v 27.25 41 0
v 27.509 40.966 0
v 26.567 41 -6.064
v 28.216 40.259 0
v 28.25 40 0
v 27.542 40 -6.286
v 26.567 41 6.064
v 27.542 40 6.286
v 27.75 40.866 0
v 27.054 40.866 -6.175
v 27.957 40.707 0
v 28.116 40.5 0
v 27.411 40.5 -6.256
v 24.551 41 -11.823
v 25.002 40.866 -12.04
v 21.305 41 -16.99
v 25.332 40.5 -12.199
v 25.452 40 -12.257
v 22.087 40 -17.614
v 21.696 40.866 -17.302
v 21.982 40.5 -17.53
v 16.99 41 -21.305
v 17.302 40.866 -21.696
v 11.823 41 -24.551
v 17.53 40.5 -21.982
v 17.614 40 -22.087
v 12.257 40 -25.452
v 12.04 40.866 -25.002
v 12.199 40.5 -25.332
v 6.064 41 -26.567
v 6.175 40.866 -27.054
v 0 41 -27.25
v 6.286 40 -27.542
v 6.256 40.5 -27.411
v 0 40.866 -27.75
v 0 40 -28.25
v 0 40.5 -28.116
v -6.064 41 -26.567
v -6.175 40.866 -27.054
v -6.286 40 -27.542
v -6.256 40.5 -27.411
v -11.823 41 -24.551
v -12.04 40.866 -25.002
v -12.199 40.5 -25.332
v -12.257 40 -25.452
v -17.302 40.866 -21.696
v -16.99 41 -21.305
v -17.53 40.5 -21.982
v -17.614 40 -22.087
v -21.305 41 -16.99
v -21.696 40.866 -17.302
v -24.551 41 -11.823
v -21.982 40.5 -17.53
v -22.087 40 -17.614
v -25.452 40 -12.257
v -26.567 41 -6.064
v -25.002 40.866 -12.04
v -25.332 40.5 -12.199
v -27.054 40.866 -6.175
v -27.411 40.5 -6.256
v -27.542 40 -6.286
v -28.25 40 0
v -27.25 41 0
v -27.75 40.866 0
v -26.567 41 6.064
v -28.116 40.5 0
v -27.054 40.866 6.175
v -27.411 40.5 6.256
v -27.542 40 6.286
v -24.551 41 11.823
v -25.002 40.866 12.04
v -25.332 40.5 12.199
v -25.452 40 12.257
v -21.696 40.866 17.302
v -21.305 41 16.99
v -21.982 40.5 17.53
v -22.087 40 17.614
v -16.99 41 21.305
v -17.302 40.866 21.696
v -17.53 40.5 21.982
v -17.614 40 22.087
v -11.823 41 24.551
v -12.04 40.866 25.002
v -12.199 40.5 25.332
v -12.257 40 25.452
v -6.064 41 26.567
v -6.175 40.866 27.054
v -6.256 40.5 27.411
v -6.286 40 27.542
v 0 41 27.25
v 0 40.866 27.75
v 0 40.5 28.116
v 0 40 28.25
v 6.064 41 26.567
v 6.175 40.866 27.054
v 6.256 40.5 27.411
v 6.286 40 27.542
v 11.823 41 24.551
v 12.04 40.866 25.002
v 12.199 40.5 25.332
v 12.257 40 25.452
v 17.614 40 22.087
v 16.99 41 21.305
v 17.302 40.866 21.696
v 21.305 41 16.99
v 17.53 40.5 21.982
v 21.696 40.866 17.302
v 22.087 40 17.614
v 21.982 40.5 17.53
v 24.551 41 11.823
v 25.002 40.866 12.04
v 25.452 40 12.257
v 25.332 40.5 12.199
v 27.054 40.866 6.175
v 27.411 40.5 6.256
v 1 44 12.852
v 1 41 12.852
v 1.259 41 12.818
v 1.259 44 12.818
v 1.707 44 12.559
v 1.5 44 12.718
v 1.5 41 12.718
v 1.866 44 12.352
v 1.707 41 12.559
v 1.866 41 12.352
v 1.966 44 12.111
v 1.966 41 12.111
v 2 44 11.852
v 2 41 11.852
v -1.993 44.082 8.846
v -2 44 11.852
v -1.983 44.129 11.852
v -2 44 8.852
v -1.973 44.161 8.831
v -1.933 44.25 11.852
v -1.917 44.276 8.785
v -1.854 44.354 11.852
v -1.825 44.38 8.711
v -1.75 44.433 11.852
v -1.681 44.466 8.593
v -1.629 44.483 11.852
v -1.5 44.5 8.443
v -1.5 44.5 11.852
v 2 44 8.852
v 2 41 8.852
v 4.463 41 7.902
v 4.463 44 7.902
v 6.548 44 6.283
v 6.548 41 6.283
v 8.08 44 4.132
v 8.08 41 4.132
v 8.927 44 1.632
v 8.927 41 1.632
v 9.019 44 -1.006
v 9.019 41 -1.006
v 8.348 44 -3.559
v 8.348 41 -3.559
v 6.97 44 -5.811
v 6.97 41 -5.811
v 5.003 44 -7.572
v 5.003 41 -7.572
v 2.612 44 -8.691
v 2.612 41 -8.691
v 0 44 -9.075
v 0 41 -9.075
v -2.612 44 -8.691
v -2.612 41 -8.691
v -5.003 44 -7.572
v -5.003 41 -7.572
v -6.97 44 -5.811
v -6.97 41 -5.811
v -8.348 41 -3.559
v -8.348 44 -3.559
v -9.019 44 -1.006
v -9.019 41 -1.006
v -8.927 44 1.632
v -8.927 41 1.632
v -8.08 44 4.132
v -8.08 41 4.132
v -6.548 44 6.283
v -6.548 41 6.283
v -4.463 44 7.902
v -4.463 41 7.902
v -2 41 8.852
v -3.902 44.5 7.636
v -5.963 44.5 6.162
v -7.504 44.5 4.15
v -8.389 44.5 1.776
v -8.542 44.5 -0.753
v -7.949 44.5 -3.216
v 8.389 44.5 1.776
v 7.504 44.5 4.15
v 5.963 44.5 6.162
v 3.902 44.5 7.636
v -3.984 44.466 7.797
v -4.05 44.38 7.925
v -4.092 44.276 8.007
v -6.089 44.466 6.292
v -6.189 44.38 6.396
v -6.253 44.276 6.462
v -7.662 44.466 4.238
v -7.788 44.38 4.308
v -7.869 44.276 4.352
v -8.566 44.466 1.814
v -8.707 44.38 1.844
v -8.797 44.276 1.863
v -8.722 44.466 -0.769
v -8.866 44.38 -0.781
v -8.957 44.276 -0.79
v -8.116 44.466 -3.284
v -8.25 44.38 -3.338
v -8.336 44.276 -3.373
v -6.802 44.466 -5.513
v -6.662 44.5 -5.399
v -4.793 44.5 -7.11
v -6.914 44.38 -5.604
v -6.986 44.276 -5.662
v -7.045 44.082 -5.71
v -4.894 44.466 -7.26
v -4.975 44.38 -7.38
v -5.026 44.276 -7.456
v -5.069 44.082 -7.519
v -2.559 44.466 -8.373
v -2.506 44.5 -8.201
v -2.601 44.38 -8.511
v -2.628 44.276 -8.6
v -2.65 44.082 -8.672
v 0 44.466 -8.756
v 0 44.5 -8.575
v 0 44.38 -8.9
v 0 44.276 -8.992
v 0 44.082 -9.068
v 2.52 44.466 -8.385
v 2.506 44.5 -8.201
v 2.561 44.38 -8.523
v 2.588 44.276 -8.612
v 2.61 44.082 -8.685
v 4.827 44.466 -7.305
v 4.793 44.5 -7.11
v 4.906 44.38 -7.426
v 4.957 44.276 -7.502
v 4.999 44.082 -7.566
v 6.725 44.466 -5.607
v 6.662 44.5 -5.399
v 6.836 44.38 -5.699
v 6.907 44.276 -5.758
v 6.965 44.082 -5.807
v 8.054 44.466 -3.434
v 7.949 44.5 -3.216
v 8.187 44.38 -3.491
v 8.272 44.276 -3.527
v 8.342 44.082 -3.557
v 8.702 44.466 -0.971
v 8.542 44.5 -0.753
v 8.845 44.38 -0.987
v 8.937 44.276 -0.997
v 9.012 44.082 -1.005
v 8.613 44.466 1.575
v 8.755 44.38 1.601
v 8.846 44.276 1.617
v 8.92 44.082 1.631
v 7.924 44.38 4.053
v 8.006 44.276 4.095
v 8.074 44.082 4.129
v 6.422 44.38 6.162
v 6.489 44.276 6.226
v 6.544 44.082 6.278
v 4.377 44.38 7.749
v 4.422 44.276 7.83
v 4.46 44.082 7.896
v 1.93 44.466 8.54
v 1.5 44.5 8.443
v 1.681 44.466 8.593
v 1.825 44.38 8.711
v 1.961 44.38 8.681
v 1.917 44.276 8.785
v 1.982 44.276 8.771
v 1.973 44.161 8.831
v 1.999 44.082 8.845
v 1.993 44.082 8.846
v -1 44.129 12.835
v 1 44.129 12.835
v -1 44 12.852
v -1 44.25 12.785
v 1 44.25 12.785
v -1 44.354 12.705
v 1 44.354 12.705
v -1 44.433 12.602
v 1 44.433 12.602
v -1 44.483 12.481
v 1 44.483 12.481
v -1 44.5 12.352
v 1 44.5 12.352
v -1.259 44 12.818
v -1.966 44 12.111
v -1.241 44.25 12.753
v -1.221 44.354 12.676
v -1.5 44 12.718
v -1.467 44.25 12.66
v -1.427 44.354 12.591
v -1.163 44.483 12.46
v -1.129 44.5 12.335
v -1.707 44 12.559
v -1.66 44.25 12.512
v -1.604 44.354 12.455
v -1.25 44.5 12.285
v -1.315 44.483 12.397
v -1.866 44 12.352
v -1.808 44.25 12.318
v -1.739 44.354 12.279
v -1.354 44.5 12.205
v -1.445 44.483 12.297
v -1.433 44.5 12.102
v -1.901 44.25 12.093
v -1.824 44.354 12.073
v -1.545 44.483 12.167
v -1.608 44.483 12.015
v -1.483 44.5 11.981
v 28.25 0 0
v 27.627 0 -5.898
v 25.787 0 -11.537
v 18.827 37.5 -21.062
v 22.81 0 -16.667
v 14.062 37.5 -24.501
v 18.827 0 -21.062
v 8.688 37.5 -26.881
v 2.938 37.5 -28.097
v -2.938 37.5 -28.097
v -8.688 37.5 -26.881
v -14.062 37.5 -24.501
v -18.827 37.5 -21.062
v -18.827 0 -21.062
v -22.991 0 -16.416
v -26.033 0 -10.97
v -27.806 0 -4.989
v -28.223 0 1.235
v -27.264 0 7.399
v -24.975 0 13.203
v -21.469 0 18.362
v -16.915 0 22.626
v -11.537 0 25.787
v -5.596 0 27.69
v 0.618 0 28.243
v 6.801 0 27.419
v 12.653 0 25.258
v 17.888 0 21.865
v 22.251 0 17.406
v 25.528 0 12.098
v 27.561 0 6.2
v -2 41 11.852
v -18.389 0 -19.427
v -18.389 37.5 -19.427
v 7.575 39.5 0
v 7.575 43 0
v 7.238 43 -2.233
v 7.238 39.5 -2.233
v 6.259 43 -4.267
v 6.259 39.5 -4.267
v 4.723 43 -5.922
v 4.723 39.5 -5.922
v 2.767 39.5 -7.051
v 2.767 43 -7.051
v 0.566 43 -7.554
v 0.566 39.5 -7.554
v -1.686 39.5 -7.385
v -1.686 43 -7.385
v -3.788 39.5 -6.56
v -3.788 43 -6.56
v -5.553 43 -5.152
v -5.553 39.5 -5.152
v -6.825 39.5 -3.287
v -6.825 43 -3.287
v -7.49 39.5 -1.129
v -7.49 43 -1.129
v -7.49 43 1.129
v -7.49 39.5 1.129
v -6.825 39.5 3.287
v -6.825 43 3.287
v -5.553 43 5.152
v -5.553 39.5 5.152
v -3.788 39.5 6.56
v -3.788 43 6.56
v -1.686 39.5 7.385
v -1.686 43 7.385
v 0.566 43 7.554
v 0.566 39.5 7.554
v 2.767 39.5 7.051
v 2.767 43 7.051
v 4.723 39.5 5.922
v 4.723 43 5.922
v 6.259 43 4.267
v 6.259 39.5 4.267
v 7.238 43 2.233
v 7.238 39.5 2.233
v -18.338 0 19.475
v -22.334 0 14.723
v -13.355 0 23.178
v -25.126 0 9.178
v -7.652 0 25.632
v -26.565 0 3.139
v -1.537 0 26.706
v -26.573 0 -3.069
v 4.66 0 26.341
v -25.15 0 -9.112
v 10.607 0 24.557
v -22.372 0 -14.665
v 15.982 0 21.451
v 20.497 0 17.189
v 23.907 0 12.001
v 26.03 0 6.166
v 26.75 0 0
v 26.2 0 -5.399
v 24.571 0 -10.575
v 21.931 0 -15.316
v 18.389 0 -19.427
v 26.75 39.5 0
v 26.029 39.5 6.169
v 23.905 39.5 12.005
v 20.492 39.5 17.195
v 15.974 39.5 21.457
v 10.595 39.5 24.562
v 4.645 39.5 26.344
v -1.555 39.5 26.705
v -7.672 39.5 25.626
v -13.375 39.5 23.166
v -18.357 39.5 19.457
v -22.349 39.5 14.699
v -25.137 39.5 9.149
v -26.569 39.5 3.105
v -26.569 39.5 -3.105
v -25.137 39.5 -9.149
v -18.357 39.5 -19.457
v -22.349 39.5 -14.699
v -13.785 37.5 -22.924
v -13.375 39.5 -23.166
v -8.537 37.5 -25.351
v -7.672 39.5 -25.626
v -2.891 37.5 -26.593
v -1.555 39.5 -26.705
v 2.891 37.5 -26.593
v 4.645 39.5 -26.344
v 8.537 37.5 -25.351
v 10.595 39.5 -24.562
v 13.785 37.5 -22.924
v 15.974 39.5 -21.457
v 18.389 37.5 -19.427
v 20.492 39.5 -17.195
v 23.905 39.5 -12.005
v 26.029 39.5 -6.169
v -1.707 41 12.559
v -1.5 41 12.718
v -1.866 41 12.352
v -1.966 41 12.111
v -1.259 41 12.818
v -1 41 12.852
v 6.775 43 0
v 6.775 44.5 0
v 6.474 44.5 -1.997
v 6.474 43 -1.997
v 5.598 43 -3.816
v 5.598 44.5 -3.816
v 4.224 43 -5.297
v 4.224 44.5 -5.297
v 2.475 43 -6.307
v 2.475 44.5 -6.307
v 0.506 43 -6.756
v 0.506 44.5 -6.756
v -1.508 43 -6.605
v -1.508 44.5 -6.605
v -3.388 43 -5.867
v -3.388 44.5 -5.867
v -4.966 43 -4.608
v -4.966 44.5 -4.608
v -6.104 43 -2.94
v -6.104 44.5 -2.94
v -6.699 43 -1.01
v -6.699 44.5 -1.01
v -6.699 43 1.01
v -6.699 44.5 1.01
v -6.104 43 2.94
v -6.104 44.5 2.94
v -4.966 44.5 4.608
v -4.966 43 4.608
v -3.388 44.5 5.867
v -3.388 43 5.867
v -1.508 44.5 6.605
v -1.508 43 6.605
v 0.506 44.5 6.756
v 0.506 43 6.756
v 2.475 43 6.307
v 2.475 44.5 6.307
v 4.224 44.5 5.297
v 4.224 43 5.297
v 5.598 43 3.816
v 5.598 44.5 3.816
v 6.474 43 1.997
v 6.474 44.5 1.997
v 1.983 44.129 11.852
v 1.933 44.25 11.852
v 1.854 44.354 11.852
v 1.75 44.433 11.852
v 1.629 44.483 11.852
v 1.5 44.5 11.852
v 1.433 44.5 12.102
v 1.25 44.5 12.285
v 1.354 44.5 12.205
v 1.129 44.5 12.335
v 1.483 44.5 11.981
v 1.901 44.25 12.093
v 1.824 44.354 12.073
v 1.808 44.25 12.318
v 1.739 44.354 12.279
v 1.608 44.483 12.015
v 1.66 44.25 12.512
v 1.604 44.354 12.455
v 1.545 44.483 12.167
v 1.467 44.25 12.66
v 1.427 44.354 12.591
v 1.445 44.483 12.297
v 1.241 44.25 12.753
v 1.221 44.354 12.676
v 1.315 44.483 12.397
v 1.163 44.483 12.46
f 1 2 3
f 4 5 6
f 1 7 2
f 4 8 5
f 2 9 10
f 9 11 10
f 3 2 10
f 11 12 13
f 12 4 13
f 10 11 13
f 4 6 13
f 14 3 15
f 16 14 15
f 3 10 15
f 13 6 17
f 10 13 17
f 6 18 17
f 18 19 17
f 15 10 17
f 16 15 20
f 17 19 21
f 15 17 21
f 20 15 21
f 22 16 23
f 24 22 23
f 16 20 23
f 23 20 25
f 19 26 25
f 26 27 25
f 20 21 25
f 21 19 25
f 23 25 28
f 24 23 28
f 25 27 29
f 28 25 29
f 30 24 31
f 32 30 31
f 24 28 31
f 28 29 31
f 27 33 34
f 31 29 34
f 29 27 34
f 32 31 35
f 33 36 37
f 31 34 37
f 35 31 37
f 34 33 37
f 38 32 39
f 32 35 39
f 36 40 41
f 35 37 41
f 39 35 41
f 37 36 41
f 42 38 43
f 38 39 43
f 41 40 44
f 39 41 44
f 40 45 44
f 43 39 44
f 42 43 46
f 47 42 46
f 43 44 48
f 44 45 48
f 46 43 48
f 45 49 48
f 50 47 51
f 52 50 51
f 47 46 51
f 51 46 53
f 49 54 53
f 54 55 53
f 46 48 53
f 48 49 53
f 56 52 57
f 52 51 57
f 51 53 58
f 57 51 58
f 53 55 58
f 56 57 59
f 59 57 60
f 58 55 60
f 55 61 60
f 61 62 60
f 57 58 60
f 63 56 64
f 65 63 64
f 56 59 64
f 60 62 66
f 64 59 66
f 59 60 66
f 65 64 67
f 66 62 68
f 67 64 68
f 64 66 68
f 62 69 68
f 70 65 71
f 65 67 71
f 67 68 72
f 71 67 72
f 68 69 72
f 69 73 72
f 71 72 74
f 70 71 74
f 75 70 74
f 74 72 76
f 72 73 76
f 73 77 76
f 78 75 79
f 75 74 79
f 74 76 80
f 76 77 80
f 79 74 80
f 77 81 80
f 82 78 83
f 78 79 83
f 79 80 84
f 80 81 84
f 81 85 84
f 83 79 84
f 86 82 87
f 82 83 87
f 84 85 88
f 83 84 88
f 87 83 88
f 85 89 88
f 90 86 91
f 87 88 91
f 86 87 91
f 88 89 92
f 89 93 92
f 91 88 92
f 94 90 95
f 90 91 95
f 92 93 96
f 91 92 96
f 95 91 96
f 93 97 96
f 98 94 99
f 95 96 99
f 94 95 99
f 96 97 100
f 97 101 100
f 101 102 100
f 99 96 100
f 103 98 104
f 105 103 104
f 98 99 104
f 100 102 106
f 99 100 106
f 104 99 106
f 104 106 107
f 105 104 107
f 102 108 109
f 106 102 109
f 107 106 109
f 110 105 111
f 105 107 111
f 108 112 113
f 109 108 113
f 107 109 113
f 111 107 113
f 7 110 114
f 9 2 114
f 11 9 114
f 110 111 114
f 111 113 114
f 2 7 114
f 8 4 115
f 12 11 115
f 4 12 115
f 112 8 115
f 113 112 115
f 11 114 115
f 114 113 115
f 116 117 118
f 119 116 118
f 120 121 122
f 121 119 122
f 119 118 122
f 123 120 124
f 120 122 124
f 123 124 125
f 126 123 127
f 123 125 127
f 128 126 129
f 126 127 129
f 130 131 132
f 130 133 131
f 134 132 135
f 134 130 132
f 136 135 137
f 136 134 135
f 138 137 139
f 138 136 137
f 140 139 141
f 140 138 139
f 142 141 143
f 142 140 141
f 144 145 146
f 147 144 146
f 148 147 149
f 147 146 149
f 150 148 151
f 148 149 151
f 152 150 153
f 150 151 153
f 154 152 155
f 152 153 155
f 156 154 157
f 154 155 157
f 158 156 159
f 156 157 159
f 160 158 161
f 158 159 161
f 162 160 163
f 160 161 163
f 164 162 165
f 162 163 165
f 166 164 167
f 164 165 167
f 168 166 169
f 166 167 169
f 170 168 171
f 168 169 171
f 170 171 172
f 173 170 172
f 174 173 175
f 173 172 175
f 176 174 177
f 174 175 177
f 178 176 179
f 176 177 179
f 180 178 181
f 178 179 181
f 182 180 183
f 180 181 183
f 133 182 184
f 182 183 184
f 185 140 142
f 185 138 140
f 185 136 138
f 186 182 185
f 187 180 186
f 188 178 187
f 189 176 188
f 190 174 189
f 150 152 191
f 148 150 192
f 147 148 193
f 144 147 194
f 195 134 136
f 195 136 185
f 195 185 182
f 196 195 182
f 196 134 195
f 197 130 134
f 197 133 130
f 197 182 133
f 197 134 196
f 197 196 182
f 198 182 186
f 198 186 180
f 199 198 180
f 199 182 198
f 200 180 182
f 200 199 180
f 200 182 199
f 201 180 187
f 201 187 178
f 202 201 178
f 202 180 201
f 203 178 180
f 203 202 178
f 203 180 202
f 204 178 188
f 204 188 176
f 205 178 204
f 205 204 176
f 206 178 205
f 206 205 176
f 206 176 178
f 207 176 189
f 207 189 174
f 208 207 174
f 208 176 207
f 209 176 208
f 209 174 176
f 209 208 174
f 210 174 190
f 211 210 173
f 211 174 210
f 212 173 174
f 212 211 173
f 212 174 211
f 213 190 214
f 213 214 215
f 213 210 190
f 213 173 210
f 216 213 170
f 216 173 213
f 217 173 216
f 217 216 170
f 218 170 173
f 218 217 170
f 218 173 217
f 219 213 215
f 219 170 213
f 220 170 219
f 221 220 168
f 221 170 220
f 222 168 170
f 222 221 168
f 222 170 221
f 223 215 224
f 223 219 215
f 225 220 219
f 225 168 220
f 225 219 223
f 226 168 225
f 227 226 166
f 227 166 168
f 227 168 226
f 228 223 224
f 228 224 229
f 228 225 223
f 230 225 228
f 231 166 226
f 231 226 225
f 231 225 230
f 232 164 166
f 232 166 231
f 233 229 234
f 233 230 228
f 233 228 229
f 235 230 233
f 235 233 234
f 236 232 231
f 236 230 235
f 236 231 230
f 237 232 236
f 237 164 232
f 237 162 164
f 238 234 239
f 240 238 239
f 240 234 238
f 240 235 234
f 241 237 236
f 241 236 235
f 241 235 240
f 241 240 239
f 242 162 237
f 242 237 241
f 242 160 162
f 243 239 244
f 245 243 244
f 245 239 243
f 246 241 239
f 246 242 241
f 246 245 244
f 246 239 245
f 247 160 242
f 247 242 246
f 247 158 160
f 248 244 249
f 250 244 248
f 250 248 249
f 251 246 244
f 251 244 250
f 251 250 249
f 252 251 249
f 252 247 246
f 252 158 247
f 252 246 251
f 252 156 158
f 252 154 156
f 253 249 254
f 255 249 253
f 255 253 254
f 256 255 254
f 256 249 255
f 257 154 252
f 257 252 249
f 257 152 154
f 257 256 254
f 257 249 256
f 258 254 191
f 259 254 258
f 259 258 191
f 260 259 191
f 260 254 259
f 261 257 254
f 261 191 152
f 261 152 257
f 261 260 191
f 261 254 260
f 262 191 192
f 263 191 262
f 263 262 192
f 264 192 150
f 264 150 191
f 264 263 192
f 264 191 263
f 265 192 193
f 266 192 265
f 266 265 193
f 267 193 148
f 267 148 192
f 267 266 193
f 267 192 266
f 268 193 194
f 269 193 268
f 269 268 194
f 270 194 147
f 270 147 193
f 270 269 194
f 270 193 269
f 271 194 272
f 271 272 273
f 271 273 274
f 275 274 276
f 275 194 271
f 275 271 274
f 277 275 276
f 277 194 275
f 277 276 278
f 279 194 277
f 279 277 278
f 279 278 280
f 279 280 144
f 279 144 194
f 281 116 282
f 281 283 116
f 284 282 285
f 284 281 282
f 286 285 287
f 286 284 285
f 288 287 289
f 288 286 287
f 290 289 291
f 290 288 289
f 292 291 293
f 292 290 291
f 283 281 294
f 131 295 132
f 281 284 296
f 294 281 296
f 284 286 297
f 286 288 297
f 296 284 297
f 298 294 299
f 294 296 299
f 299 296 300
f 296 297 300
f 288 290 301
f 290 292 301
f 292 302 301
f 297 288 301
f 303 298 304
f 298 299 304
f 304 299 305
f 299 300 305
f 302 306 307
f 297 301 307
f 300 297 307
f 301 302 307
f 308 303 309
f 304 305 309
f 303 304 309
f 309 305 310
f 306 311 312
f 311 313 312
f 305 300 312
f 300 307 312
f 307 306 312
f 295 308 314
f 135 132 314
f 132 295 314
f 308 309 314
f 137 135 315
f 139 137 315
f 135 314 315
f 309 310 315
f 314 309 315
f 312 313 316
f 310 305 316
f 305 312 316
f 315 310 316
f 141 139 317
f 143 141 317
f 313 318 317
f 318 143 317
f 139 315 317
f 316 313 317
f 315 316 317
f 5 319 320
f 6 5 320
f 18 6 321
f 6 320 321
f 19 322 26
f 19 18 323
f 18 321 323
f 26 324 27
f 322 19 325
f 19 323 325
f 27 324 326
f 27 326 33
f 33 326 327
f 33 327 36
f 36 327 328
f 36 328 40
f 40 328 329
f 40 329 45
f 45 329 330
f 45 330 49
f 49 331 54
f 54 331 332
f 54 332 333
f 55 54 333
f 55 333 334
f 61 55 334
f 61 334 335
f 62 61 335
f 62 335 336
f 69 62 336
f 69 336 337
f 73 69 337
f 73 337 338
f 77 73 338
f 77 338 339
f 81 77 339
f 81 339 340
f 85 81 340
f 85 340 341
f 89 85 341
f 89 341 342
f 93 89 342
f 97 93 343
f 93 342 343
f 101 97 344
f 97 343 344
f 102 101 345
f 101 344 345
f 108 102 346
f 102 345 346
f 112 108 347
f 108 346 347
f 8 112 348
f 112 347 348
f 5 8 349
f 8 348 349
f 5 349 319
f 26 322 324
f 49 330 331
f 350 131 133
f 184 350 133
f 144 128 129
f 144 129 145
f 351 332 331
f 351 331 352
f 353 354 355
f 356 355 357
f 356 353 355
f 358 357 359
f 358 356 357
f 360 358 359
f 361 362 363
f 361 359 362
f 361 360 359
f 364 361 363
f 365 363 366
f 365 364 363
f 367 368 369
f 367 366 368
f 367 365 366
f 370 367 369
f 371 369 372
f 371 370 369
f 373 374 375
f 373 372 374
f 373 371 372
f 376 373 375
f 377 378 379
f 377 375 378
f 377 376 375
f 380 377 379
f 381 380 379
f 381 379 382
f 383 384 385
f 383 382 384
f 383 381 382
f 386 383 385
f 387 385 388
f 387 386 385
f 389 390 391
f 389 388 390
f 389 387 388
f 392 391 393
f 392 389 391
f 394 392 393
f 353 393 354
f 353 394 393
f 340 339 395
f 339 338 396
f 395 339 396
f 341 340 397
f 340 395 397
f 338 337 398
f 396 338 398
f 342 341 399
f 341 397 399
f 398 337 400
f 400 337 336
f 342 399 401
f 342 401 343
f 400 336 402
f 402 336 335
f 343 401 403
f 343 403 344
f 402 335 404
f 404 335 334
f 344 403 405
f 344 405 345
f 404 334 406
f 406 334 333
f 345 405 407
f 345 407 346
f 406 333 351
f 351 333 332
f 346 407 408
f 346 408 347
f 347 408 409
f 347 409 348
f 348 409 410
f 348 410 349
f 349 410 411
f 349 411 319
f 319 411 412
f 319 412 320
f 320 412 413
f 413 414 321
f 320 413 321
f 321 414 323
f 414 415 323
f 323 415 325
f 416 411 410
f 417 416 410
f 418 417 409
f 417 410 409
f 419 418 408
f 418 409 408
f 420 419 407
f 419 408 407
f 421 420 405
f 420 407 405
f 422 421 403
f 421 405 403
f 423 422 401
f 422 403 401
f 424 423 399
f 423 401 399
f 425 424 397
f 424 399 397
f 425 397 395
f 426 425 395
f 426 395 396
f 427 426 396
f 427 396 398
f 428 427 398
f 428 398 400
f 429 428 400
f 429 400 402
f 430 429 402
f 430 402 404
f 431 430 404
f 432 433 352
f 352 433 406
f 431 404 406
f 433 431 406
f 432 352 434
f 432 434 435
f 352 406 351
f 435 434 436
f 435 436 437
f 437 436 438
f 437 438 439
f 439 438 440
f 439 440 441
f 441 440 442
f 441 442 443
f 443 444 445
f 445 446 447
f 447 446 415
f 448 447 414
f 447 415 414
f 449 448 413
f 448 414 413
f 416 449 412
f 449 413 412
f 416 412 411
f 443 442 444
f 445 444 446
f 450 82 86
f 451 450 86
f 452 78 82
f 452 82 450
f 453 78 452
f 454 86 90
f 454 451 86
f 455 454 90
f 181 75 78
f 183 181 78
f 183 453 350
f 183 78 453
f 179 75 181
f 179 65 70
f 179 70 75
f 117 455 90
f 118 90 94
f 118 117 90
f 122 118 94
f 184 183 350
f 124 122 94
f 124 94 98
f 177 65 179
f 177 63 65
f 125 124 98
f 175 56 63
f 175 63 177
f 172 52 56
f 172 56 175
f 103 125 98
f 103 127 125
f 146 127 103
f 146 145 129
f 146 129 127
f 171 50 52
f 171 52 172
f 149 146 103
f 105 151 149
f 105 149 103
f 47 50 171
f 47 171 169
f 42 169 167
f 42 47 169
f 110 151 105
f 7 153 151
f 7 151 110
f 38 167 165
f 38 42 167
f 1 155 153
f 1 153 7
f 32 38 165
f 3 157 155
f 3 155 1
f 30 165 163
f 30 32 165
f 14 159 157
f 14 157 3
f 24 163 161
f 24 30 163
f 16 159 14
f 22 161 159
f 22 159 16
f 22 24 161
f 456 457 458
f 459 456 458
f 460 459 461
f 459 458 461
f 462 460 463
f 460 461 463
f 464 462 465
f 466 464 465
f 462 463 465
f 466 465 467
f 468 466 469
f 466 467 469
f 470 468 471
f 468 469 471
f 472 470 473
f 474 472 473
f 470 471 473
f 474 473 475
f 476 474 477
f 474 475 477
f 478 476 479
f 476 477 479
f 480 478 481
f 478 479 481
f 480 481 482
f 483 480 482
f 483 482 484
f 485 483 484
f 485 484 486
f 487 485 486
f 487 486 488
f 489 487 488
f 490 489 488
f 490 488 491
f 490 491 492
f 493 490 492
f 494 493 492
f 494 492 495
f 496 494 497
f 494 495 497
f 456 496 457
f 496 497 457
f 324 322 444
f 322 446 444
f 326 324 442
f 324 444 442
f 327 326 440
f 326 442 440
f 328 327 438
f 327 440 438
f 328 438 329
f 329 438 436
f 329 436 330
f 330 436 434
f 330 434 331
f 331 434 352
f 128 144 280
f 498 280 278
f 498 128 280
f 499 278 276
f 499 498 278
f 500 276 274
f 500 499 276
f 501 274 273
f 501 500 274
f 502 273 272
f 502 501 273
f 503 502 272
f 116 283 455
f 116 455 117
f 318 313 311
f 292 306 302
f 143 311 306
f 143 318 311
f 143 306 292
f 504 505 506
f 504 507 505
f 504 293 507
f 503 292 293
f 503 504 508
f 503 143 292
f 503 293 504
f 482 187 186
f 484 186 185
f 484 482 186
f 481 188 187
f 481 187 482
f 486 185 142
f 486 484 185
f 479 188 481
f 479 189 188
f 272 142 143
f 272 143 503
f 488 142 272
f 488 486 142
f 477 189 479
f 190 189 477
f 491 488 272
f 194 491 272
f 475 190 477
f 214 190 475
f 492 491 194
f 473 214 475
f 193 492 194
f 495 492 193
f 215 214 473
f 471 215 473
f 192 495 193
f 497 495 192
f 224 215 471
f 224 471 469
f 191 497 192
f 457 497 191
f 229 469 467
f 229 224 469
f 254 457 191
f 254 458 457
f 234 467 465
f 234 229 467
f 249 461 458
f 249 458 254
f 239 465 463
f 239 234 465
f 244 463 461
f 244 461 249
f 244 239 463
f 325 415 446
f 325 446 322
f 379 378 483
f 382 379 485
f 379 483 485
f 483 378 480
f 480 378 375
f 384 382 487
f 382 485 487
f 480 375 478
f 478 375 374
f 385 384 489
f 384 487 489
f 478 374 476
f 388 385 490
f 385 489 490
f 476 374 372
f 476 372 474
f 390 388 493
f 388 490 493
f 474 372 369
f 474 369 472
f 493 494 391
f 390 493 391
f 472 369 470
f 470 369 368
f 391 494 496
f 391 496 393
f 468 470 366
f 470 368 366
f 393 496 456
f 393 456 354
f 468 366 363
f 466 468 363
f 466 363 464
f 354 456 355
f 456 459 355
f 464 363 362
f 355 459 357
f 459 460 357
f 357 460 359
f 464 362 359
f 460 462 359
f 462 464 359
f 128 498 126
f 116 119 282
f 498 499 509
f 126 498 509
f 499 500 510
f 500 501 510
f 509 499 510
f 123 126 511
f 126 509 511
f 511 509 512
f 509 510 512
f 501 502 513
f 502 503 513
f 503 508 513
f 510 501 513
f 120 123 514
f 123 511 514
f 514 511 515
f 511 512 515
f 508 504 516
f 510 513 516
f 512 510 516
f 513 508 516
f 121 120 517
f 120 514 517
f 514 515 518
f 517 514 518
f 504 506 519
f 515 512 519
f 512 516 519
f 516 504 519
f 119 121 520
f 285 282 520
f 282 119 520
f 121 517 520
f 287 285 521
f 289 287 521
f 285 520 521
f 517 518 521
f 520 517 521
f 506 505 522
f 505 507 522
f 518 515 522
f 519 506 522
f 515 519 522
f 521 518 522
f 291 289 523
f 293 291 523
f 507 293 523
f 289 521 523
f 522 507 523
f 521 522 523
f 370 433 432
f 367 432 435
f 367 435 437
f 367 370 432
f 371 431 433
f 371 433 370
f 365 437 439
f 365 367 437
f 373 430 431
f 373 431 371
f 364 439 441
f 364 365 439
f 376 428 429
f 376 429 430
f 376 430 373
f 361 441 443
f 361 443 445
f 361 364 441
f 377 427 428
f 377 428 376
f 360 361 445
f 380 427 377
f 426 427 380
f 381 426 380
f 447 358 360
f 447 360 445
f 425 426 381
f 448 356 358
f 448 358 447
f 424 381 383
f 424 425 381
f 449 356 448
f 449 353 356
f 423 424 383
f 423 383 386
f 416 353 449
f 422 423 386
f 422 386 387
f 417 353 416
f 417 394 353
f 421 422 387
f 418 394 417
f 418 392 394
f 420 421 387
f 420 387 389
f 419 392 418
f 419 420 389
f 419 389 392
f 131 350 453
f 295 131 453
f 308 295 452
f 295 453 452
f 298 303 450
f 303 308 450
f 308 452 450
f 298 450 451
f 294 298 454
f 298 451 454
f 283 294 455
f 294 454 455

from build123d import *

# Parameters (mm, degrees)
SKETCH1_R           = 28.25
BOSS_EXTRUDE1_DEPTH = 41
SKETCH2_R           = 26.75
CUT_EXTRUDE1_DEPTH  = 39.5
SKETCH3_R           = 9.075
SKETCH3_R_2         = 7.575
BOSS_EXTRUDE2_DEPTH = 3.5
SKETCH4_R           = 9.075
SKETCH4_R_2         = 6.775
BOSS_EXTRUDE3_DEPTH = 1.5
SKETCH5_R           = 7.575
CUT_EXTRUDE2_DEPTH  = 1.5
SKETCH6_W           = 4
SKETCH6_H           = 4
BOSS_EXTRUDE4_DEPTH = 3.5
CUT_EXTRUDE3_DEPTH  = 37.5
FILLET1_R           = 1
FILLET1_2_R         = 0.5


with BuildPart() as part:
    # Sketch1 → Boss-Extrude1 (new body)
    with BuildSketch(Plane(origin=(0, 0, 0), x_dir=(1, 0, 0), z_dir=(0, 1, 0))):
        Circle(SKETCH1_R)
    extrude(amount=BOSS_EXTRUDE1_DEPTH)

    # Sketch2 → Cut-Extrude1 (cut)
    with BuildSketch(Plane.XZ):
        Circle(SKETCH2_R)
    extrude(amount=-CUT_EXTRUDE1_DEPTH, mode=Mode.SUBTRACT)

    # Sketch3 → Boss-Extrude2 (add)
    with BuildSketch(Plane(origin=(0, 41, 0), x_dir=(1, 0, 0), z_dir=(0, 1, 0))):
        Circle(SKETCH3_R)
        Circle(SKETCH3_R_2, mode=Mode.SUBTRACT)
    extrude(amount=BOSS_EXTRUDE2_DEPTH)

    # Sketch4 → Boss-Extrude3 (add)
    with BuildSketch(Plane(origin=(0, 44.5, 0), x_dir=(1, 0, 0), z_dir=(0, 1, 0))):
        Circle(SKETCH4_R)
        Circle(SKETCH4_R_2, mode=Mode.SUBTRACT)
    extrude(amount=-BOSS_EXTRUDE3_DEPTH)

    # Sketch5 → Cut-Extrude2 (cut)
    with BuildSketch(Plane(origin=(0, 41, 0), x_dir=(1, 0, 0), z_dir=(0, 1, 0))):
        Circle(SKETCH5_R)
    extrude(amount=-CUT_EXTRUDE2_DEPTH, mode=Mode.SUBTRACT)

    # Sketch6 → Boss-Extrude4 (add)
    with BuildSketch(Plane(origin=(0, 44.5, 0), x_dir=(1, 0, 0), z_dir=(0, 1, 0))):
        with Locations((0, -10.851871271)):
            Rectangle(SKETCH6_W, SKETCH6_H)
    extrude(amount=-BOSS_EXTRUDE4_DEPTH)

    # Sketch8 → Cut-Extrude3 (cut)
    with BuildSketch(Plane.XZ):
        with BuildLine():
            Line((-18.827156573, -21.06182982), (-16.65, -12.936570875))
            Line((-16.65, -12.936570875), (-16.65, 12.95))
            Line((-16.65, 12.95), (16.65, 12.95))
            Line((16.65, 12.95), (16.65, -12.936570875))
            Line((16.65, -12.936570875), (18.827156573, -21.06182982))
            ThreePointArc((18.827156573, -21.06182982), (0, -28.25), (-18.827156573, -21.06182982))
        make_face()
    extrude(amount=-CUT_EXTRUDE3_DEPTH, mode=Mode.SUBTRACT)

    # Fillet1
    fillet1_edges = [part.edges().sort_by_distance(p)[0] for p in [
        (-2, 42.75, 12.851871271),
        (2, 42.75, 12.851871271),
        (-28.25, 41, 0),
    ]]
    fillet(fillet1_edges, radius=FILLET1_R)

    # Fillet1 2
    fillet1_2_edges = [part.edges().sort_by_distance(p)[0] for p in [
        (0, 44.5, -9.075),
        (-2, 44.5, 10.851871271),
        (0, 44.5, 12.851871271),
        (2, 44.5, 10.851871271),
    ]]
    fillet(fillet1_2_edges, radius=FILLET1_2_R)


solid = part.part
